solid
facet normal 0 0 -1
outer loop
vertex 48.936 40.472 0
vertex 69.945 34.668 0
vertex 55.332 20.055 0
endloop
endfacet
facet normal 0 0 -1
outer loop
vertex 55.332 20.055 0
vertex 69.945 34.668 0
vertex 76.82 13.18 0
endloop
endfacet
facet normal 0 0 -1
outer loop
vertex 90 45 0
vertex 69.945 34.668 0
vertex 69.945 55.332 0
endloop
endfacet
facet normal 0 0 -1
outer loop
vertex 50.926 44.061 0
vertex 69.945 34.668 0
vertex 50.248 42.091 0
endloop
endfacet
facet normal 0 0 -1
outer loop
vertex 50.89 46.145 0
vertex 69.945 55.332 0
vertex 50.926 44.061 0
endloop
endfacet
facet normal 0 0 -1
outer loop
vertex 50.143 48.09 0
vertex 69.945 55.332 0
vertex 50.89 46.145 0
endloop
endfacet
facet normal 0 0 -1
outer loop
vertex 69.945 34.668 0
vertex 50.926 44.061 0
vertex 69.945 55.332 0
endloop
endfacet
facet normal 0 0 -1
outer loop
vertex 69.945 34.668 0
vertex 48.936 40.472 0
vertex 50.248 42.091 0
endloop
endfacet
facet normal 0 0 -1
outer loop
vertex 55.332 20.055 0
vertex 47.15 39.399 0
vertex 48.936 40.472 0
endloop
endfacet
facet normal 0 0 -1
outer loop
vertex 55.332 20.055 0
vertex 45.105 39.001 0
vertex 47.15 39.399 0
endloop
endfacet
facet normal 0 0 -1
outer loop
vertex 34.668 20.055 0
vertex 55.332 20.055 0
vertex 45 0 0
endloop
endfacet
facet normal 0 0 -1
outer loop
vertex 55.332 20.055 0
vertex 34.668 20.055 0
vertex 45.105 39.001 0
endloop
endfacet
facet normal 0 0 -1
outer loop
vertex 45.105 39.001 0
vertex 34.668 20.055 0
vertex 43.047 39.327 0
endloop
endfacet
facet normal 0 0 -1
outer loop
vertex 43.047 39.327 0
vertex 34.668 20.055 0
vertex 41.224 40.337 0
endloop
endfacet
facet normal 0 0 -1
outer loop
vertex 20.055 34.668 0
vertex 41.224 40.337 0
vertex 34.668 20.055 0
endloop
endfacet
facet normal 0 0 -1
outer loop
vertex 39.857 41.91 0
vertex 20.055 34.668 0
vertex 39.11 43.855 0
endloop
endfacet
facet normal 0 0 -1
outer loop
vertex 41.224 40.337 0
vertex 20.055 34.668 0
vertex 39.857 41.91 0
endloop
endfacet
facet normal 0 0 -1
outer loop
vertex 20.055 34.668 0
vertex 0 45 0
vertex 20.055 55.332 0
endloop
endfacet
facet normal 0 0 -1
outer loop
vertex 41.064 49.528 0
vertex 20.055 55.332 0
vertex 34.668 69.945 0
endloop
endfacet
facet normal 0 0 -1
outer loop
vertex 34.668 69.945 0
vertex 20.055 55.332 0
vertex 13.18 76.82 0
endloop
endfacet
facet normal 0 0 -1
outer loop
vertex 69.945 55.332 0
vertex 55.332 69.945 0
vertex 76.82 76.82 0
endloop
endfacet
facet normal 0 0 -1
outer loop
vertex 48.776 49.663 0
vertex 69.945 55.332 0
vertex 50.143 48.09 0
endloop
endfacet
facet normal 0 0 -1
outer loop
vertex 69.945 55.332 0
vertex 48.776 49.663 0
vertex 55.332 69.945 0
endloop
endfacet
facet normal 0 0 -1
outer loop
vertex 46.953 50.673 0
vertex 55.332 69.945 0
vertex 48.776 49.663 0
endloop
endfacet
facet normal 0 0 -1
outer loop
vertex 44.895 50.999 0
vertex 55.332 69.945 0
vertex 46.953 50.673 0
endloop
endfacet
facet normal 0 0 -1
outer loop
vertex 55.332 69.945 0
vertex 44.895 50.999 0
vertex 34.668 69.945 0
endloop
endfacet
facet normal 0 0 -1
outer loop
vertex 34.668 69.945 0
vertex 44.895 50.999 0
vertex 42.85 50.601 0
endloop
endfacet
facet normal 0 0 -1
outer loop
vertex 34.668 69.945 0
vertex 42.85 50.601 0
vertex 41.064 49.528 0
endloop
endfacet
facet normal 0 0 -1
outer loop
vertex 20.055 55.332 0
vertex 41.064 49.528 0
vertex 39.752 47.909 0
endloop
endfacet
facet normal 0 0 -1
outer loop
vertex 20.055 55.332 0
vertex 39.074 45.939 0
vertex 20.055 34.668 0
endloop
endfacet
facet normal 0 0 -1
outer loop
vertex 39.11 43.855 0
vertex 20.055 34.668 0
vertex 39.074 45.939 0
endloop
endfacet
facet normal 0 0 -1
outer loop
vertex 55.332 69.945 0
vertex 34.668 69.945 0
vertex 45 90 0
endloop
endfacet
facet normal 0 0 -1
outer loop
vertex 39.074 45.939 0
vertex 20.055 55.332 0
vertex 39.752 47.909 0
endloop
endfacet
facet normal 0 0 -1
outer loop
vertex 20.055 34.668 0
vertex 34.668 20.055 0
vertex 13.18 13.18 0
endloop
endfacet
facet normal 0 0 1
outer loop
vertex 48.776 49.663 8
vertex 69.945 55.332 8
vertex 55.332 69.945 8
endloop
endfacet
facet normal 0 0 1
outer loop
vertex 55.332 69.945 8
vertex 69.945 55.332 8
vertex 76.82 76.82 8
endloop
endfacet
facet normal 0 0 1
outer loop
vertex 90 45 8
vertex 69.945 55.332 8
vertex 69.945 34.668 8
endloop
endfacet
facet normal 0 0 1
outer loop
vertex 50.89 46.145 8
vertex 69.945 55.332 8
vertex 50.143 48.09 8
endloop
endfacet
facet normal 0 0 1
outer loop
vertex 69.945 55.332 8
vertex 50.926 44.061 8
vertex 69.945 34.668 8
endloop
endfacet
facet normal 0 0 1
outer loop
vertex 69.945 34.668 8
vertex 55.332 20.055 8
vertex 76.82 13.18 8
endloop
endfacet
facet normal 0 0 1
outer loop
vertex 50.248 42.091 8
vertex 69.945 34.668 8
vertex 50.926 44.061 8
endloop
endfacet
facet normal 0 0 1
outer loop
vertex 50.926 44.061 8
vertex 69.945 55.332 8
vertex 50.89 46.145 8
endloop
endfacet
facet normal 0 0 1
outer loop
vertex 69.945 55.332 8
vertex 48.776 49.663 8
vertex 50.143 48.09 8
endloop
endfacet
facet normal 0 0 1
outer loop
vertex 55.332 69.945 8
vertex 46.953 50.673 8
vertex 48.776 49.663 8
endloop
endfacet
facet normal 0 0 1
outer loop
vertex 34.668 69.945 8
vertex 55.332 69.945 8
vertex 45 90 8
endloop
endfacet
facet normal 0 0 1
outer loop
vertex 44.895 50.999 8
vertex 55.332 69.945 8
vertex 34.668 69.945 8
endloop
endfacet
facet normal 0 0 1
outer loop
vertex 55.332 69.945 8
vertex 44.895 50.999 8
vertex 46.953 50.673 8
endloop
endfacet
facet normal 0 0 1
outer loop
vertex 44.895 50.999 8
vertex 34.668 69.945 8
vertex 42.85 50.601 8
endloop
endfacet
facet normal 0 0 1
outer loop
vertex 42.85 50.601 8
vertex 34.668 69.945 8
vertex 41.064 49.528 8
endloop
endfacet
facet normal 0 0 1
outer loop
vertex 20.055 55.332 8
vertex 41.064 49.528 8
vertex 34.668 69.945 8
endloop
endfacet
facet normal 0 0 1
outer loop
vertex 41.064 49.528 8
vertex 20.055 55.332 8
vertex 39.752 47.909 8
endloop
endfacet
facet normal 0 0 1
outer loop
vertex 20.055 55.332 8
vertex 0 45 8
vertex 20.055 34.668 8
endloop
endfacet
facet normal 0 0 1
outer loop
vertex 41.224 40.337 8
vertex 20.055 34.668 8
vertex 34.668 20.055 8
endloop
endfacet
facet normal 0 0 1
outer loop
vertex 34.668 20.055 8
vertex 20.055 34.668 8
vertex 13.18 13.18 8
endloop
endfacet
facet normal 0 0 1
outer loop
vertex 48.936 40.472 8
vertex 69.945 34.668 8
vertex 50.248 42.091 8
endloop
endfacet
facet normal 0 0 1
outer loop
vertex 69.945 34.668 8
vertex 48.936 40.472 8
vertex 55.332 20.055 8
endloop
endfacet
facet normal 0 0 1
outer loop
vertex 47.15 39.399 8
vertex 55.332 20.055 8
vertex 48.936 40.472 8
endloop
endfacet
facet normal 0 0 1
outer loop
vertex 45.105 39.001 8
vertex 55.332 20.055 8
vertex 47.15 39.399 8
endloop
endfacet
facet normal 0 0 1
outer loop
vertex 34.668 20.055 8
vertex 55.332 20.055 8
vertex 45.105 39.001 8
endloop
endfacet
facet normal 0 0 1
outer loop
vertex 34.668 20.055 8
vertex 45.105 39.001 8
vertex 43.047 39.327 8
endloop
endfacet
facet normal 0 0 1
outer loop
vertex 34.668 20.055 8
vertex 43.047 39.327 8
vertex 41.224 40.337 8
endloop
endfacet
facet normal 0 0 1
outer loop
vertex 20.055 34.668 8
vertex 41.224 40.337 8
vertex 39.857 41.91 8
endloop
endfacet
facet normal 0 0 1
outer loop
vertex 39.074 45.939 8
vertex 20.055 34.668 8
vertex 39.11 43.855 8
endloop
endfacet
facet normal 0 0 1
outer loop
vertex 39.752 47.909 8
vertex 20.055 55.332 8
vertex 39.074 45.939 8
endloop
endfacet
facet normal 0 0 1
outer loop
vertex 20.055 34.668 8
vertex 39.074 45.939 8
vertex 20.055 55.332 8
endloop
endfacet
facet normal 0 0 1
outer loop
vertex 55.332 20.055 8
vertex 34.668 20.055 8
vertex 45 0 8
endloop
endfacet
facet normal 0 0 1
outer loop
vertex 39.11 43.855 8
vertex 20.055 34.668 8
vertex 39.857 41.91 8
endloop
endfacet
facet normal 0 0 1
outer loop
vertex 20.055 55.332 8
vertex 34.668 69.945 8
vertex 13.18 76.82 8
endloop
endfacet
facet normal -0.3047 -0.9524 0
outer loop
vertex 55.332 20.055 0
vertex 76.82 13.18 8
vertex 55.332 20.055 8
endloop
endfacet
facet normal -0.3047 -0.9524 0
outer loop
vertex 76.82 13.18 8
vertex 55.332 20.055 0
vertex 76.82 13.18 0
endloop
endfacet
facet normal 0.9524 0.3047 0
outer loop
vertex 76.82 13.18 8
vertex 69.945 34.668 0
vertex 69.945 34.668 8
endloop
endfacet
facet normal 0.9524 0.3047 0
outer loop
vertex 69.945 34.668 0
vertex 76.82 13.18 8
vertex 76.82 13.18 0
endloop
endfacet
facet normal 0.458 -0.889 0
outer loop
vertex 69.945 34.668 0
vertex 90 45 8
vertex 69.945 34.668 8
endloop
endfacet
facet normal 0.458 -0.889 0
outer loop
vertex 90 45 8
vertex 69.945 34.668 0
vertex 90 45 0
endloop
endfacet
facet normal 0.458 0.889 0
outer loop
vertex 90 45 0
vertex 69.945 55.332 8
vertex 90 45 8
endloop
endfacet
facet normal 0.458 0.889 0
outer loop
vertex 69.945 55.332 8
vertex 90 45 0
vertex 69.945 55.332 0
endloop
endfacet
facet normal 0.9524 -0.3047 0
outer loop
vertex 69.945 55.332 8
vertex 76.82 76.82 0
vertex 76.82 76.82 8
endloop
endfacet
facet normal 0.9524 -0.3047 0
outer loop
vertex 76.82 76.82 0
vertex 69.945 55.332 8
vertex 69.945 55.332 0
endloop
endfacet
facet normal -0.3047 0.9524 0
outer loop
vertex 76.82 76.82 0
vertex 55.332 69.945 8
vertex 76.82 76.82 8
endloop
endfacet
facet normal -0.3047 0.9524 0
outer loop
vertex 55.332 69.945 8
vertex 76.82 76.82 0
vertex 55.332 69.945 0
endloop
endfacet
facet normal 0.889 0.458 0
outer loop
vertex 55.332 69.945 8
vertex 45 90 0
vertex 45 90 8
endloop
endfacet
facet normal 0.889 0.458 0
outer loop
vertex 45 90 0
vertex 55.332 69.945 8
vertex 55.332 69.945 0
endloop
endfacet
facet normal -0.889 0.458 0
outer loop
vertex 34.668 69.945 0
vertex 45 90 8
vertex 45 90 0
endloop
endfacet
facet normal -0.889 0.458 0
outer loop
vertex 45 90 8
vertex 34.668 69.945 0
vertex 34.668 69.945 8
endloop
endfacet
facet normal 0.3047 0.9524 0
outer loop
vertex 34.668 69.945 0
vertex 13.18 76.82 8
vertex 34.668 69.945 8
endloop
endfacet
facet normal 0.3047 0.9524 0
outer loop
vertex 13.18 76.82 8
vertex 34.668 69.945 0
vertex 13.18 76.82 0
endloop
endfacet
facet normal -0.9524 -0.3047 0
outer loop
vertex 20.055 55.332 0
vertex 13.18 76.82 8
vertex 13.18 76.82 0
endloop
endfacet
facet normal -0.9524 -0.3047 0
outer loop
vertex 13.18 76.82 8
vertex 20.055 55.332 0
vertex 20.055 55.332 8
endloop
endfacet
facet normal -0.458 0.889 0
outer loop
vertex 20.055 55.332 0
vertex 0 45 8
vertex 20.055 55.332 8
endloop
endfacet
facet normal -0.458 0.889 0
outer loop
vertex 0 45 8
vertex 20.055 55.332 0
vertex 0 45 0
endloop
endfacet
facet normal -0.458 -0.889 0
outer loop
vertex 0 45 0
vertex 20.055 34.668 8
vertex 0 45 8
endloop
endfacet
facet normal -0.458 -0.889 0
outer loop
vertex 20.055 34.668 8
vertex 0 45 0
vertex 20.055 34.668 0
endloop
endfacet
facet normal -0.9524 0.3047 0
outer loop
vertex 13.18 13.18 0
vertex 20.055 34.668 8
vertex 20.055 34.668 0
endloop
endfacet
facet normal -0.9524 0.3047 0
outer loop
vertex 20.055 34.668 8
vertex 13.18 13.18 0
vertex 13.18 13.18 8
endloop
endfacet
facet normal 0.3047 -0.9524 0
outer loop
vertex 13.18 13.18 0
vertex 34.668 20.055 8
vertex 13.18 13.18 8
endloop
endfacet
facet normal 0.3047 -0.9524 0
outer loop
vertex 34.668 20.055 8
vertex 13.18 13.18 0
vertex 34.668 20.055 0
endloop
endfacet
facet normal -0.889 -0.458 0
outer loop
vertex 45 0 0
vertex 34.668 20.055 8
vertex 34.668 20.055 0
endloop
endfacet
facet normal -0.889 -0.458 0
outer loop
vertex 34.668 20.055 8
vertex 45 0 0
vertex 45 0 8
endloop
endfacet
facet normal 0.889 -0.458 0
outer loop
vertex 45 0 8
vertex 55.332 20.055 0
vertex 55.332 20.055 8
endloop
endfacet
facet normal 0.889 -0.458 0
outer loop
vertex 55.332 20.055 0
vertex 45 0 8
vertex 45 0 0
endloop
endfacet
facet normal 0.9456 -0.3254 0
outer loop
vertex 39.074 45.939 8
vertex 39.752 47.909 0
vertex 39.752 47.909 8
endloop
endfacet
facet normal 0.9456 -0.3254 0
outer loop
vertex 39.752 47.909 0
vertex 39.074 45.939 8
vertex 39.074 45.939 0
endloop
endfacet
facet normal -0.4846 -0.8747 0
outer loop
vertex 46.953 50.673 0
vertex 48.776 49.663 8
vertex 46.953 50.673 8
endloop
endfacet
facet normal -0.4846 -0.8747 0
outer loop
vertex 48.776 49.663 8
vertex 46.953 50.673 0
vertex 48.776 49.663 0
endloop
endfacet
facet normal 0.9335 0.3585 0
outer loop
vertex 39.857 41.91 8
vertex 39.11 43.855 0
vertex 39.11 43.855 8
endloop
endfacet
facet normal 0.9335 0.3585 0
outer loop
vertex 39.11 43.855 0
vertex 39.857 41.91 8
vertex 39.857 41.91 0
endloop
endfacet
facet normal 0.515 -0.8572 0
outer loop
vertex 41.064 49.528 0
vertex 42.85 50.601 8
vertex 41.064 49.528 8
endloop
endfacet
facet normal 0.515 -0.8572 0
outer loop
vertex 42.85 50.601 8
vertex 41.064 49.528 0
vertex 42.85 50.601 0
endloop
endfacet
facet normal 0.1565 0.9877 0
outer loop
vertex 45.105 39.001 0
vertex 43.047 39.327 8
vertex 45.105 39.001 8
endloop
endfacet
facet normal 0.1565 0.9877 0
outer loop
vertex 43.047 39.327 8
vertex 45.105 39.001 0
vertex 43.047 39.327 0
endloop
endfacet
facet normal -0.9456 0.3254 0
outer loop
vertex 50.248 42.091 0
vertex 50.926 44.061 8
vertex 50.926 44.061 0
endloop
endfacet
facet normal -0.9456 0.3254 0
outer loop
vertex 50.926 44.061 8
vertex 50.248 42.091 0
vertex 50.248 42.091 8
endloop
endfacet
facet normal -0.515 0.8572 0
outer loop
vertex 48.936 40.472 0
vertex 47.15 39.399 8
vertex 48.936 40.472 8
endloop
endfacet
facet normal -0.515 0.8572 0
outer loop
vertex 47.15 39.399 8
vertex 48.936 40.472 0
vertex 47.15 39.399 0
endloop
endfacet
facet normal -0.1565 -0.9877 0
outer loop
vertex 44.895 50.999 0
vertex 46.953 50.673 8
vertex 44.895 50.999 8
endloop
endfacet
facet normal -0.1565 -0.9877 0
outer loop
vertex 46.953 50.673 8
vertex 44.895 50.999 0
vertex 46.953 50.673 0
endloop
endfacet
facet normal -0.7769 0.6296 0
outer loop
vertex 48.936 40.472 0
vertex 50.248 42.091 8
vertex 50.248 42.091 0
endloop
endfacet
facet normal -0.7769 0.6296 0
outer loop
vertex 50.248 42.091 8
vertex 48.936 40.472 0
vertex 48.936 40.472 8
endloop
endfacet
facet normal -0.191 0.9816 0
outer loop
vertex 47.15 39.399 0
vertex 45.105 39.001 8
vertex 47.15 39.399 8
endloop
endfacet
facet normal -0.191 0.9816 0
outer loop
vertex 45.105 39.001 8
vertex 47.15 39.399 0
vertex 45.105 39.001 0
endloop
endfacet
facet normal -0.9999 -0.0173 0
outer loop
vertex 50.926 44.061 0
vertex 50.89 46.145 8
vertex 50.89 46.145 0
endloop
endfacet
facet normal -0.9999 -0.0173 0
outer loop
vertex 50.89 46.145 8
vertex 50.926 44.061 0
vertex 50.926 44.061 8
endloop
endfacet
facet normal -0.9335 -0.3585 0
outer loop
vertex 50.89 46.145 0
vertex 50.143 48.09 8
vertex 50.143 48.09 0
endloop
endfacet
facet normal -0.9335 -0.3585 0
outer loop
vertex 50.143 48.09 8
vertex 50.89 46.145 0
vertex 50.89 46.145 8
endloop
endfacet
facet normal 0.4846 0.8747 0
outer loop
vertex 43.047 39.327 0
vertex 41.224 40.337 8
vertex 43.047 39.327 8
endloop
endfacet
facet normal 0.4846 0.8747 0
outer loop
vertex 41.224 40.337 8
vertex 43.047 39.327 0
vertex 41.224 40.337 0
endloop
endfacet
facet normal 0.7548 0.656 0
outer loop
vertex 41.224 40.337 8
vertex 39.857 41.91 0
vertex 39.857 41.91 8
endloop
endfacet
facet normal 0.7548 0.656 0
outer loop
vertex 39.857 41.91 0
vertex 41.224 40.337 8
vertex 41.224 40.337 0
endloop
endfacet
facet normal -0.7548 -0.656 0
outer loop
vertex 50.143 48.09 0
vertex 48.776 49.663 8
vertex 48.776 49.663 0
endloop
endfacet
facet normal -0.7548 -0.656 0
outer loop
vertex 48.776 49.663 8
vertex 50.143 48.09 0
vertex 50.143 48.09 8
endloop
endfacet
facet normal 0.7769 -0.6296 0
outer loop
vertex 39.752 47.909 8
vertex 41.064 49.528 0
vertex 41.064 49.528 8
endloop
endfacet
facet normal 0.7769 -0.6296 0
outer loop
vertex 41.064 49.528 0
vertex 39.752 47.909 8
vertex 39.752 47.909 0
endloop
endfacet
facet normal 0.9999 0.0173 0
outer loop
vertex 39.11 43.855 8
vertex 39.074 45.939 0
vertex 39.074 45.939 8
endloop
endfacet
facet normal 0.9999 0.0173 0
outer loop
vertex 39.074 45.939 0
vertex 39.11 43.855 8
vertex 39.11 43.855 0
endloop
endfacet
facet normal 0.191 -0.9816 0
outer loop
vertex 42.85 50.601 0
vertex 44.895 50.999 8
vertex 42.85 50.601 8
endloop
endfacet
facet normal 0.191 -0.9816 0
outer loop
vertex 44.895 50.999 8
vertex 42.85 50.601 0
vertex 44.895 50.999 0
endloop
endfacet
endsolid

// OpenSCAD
$fn = 32;

// ----------------------------------------------------------------------
// Star wheel: 8-point star, R45
// ----------------------------------------------------------------------

// --- parameters (mm) ---
n_points = 8;             // number of points / teeth
r_out = 45;               // tip radius
r_in = 27;                // root radius
bore_r = 6;               // centre bore radius
plate_t = 8;              // plate thickness, Z (extrusion height)
bore_d = 12;              // centre bore diameter
fit_tol = 0.1;            // declared fit tolerance (prompt contract)
free_tol = 0.3;           // declared free tolerance (prompt contract)

profile = [[90, 45], [69.945, 55.332], [76.82, 76.82], [55.332, 69.945], [45, 90], [34.668, 69.945], [13.18, 76.82], [20.055, 55.332], [0, 45], [20.055, 34.668], [13.18, 13.18], [34.668, 20.055], [45, 0], [55.332, 20.055], [76.82, 13.18], [69.945, 34.668]];  // primary outline, 16 points, counter clockwise
void_1 = [[50.89, 46.145], [50.143, 48.09], [48.776, 49.663], [46.953, 50.673], [44.895, 50.999], [42.85, 50.601], [41.064, 49.528], [39.752, 47.909], [39.074, 45.939], [39.11, 43.855], [39.857, 41.91], [41.224, 40.337], [43.047, 39.327], [45.105, 39.001], [47.15, 39.399], [48.936, 40.472], [50.248, 42.091], [50.926, 44.061]];  // centre bore, 18 points

// --- the one profile operation ---
difference() {
  linear_extrude(height = plate_t) polygon(points = profile);
  translate([0, 0, -1])
    linear_extrude(height = plate_t + 2) polygon(points = void_1);
}
